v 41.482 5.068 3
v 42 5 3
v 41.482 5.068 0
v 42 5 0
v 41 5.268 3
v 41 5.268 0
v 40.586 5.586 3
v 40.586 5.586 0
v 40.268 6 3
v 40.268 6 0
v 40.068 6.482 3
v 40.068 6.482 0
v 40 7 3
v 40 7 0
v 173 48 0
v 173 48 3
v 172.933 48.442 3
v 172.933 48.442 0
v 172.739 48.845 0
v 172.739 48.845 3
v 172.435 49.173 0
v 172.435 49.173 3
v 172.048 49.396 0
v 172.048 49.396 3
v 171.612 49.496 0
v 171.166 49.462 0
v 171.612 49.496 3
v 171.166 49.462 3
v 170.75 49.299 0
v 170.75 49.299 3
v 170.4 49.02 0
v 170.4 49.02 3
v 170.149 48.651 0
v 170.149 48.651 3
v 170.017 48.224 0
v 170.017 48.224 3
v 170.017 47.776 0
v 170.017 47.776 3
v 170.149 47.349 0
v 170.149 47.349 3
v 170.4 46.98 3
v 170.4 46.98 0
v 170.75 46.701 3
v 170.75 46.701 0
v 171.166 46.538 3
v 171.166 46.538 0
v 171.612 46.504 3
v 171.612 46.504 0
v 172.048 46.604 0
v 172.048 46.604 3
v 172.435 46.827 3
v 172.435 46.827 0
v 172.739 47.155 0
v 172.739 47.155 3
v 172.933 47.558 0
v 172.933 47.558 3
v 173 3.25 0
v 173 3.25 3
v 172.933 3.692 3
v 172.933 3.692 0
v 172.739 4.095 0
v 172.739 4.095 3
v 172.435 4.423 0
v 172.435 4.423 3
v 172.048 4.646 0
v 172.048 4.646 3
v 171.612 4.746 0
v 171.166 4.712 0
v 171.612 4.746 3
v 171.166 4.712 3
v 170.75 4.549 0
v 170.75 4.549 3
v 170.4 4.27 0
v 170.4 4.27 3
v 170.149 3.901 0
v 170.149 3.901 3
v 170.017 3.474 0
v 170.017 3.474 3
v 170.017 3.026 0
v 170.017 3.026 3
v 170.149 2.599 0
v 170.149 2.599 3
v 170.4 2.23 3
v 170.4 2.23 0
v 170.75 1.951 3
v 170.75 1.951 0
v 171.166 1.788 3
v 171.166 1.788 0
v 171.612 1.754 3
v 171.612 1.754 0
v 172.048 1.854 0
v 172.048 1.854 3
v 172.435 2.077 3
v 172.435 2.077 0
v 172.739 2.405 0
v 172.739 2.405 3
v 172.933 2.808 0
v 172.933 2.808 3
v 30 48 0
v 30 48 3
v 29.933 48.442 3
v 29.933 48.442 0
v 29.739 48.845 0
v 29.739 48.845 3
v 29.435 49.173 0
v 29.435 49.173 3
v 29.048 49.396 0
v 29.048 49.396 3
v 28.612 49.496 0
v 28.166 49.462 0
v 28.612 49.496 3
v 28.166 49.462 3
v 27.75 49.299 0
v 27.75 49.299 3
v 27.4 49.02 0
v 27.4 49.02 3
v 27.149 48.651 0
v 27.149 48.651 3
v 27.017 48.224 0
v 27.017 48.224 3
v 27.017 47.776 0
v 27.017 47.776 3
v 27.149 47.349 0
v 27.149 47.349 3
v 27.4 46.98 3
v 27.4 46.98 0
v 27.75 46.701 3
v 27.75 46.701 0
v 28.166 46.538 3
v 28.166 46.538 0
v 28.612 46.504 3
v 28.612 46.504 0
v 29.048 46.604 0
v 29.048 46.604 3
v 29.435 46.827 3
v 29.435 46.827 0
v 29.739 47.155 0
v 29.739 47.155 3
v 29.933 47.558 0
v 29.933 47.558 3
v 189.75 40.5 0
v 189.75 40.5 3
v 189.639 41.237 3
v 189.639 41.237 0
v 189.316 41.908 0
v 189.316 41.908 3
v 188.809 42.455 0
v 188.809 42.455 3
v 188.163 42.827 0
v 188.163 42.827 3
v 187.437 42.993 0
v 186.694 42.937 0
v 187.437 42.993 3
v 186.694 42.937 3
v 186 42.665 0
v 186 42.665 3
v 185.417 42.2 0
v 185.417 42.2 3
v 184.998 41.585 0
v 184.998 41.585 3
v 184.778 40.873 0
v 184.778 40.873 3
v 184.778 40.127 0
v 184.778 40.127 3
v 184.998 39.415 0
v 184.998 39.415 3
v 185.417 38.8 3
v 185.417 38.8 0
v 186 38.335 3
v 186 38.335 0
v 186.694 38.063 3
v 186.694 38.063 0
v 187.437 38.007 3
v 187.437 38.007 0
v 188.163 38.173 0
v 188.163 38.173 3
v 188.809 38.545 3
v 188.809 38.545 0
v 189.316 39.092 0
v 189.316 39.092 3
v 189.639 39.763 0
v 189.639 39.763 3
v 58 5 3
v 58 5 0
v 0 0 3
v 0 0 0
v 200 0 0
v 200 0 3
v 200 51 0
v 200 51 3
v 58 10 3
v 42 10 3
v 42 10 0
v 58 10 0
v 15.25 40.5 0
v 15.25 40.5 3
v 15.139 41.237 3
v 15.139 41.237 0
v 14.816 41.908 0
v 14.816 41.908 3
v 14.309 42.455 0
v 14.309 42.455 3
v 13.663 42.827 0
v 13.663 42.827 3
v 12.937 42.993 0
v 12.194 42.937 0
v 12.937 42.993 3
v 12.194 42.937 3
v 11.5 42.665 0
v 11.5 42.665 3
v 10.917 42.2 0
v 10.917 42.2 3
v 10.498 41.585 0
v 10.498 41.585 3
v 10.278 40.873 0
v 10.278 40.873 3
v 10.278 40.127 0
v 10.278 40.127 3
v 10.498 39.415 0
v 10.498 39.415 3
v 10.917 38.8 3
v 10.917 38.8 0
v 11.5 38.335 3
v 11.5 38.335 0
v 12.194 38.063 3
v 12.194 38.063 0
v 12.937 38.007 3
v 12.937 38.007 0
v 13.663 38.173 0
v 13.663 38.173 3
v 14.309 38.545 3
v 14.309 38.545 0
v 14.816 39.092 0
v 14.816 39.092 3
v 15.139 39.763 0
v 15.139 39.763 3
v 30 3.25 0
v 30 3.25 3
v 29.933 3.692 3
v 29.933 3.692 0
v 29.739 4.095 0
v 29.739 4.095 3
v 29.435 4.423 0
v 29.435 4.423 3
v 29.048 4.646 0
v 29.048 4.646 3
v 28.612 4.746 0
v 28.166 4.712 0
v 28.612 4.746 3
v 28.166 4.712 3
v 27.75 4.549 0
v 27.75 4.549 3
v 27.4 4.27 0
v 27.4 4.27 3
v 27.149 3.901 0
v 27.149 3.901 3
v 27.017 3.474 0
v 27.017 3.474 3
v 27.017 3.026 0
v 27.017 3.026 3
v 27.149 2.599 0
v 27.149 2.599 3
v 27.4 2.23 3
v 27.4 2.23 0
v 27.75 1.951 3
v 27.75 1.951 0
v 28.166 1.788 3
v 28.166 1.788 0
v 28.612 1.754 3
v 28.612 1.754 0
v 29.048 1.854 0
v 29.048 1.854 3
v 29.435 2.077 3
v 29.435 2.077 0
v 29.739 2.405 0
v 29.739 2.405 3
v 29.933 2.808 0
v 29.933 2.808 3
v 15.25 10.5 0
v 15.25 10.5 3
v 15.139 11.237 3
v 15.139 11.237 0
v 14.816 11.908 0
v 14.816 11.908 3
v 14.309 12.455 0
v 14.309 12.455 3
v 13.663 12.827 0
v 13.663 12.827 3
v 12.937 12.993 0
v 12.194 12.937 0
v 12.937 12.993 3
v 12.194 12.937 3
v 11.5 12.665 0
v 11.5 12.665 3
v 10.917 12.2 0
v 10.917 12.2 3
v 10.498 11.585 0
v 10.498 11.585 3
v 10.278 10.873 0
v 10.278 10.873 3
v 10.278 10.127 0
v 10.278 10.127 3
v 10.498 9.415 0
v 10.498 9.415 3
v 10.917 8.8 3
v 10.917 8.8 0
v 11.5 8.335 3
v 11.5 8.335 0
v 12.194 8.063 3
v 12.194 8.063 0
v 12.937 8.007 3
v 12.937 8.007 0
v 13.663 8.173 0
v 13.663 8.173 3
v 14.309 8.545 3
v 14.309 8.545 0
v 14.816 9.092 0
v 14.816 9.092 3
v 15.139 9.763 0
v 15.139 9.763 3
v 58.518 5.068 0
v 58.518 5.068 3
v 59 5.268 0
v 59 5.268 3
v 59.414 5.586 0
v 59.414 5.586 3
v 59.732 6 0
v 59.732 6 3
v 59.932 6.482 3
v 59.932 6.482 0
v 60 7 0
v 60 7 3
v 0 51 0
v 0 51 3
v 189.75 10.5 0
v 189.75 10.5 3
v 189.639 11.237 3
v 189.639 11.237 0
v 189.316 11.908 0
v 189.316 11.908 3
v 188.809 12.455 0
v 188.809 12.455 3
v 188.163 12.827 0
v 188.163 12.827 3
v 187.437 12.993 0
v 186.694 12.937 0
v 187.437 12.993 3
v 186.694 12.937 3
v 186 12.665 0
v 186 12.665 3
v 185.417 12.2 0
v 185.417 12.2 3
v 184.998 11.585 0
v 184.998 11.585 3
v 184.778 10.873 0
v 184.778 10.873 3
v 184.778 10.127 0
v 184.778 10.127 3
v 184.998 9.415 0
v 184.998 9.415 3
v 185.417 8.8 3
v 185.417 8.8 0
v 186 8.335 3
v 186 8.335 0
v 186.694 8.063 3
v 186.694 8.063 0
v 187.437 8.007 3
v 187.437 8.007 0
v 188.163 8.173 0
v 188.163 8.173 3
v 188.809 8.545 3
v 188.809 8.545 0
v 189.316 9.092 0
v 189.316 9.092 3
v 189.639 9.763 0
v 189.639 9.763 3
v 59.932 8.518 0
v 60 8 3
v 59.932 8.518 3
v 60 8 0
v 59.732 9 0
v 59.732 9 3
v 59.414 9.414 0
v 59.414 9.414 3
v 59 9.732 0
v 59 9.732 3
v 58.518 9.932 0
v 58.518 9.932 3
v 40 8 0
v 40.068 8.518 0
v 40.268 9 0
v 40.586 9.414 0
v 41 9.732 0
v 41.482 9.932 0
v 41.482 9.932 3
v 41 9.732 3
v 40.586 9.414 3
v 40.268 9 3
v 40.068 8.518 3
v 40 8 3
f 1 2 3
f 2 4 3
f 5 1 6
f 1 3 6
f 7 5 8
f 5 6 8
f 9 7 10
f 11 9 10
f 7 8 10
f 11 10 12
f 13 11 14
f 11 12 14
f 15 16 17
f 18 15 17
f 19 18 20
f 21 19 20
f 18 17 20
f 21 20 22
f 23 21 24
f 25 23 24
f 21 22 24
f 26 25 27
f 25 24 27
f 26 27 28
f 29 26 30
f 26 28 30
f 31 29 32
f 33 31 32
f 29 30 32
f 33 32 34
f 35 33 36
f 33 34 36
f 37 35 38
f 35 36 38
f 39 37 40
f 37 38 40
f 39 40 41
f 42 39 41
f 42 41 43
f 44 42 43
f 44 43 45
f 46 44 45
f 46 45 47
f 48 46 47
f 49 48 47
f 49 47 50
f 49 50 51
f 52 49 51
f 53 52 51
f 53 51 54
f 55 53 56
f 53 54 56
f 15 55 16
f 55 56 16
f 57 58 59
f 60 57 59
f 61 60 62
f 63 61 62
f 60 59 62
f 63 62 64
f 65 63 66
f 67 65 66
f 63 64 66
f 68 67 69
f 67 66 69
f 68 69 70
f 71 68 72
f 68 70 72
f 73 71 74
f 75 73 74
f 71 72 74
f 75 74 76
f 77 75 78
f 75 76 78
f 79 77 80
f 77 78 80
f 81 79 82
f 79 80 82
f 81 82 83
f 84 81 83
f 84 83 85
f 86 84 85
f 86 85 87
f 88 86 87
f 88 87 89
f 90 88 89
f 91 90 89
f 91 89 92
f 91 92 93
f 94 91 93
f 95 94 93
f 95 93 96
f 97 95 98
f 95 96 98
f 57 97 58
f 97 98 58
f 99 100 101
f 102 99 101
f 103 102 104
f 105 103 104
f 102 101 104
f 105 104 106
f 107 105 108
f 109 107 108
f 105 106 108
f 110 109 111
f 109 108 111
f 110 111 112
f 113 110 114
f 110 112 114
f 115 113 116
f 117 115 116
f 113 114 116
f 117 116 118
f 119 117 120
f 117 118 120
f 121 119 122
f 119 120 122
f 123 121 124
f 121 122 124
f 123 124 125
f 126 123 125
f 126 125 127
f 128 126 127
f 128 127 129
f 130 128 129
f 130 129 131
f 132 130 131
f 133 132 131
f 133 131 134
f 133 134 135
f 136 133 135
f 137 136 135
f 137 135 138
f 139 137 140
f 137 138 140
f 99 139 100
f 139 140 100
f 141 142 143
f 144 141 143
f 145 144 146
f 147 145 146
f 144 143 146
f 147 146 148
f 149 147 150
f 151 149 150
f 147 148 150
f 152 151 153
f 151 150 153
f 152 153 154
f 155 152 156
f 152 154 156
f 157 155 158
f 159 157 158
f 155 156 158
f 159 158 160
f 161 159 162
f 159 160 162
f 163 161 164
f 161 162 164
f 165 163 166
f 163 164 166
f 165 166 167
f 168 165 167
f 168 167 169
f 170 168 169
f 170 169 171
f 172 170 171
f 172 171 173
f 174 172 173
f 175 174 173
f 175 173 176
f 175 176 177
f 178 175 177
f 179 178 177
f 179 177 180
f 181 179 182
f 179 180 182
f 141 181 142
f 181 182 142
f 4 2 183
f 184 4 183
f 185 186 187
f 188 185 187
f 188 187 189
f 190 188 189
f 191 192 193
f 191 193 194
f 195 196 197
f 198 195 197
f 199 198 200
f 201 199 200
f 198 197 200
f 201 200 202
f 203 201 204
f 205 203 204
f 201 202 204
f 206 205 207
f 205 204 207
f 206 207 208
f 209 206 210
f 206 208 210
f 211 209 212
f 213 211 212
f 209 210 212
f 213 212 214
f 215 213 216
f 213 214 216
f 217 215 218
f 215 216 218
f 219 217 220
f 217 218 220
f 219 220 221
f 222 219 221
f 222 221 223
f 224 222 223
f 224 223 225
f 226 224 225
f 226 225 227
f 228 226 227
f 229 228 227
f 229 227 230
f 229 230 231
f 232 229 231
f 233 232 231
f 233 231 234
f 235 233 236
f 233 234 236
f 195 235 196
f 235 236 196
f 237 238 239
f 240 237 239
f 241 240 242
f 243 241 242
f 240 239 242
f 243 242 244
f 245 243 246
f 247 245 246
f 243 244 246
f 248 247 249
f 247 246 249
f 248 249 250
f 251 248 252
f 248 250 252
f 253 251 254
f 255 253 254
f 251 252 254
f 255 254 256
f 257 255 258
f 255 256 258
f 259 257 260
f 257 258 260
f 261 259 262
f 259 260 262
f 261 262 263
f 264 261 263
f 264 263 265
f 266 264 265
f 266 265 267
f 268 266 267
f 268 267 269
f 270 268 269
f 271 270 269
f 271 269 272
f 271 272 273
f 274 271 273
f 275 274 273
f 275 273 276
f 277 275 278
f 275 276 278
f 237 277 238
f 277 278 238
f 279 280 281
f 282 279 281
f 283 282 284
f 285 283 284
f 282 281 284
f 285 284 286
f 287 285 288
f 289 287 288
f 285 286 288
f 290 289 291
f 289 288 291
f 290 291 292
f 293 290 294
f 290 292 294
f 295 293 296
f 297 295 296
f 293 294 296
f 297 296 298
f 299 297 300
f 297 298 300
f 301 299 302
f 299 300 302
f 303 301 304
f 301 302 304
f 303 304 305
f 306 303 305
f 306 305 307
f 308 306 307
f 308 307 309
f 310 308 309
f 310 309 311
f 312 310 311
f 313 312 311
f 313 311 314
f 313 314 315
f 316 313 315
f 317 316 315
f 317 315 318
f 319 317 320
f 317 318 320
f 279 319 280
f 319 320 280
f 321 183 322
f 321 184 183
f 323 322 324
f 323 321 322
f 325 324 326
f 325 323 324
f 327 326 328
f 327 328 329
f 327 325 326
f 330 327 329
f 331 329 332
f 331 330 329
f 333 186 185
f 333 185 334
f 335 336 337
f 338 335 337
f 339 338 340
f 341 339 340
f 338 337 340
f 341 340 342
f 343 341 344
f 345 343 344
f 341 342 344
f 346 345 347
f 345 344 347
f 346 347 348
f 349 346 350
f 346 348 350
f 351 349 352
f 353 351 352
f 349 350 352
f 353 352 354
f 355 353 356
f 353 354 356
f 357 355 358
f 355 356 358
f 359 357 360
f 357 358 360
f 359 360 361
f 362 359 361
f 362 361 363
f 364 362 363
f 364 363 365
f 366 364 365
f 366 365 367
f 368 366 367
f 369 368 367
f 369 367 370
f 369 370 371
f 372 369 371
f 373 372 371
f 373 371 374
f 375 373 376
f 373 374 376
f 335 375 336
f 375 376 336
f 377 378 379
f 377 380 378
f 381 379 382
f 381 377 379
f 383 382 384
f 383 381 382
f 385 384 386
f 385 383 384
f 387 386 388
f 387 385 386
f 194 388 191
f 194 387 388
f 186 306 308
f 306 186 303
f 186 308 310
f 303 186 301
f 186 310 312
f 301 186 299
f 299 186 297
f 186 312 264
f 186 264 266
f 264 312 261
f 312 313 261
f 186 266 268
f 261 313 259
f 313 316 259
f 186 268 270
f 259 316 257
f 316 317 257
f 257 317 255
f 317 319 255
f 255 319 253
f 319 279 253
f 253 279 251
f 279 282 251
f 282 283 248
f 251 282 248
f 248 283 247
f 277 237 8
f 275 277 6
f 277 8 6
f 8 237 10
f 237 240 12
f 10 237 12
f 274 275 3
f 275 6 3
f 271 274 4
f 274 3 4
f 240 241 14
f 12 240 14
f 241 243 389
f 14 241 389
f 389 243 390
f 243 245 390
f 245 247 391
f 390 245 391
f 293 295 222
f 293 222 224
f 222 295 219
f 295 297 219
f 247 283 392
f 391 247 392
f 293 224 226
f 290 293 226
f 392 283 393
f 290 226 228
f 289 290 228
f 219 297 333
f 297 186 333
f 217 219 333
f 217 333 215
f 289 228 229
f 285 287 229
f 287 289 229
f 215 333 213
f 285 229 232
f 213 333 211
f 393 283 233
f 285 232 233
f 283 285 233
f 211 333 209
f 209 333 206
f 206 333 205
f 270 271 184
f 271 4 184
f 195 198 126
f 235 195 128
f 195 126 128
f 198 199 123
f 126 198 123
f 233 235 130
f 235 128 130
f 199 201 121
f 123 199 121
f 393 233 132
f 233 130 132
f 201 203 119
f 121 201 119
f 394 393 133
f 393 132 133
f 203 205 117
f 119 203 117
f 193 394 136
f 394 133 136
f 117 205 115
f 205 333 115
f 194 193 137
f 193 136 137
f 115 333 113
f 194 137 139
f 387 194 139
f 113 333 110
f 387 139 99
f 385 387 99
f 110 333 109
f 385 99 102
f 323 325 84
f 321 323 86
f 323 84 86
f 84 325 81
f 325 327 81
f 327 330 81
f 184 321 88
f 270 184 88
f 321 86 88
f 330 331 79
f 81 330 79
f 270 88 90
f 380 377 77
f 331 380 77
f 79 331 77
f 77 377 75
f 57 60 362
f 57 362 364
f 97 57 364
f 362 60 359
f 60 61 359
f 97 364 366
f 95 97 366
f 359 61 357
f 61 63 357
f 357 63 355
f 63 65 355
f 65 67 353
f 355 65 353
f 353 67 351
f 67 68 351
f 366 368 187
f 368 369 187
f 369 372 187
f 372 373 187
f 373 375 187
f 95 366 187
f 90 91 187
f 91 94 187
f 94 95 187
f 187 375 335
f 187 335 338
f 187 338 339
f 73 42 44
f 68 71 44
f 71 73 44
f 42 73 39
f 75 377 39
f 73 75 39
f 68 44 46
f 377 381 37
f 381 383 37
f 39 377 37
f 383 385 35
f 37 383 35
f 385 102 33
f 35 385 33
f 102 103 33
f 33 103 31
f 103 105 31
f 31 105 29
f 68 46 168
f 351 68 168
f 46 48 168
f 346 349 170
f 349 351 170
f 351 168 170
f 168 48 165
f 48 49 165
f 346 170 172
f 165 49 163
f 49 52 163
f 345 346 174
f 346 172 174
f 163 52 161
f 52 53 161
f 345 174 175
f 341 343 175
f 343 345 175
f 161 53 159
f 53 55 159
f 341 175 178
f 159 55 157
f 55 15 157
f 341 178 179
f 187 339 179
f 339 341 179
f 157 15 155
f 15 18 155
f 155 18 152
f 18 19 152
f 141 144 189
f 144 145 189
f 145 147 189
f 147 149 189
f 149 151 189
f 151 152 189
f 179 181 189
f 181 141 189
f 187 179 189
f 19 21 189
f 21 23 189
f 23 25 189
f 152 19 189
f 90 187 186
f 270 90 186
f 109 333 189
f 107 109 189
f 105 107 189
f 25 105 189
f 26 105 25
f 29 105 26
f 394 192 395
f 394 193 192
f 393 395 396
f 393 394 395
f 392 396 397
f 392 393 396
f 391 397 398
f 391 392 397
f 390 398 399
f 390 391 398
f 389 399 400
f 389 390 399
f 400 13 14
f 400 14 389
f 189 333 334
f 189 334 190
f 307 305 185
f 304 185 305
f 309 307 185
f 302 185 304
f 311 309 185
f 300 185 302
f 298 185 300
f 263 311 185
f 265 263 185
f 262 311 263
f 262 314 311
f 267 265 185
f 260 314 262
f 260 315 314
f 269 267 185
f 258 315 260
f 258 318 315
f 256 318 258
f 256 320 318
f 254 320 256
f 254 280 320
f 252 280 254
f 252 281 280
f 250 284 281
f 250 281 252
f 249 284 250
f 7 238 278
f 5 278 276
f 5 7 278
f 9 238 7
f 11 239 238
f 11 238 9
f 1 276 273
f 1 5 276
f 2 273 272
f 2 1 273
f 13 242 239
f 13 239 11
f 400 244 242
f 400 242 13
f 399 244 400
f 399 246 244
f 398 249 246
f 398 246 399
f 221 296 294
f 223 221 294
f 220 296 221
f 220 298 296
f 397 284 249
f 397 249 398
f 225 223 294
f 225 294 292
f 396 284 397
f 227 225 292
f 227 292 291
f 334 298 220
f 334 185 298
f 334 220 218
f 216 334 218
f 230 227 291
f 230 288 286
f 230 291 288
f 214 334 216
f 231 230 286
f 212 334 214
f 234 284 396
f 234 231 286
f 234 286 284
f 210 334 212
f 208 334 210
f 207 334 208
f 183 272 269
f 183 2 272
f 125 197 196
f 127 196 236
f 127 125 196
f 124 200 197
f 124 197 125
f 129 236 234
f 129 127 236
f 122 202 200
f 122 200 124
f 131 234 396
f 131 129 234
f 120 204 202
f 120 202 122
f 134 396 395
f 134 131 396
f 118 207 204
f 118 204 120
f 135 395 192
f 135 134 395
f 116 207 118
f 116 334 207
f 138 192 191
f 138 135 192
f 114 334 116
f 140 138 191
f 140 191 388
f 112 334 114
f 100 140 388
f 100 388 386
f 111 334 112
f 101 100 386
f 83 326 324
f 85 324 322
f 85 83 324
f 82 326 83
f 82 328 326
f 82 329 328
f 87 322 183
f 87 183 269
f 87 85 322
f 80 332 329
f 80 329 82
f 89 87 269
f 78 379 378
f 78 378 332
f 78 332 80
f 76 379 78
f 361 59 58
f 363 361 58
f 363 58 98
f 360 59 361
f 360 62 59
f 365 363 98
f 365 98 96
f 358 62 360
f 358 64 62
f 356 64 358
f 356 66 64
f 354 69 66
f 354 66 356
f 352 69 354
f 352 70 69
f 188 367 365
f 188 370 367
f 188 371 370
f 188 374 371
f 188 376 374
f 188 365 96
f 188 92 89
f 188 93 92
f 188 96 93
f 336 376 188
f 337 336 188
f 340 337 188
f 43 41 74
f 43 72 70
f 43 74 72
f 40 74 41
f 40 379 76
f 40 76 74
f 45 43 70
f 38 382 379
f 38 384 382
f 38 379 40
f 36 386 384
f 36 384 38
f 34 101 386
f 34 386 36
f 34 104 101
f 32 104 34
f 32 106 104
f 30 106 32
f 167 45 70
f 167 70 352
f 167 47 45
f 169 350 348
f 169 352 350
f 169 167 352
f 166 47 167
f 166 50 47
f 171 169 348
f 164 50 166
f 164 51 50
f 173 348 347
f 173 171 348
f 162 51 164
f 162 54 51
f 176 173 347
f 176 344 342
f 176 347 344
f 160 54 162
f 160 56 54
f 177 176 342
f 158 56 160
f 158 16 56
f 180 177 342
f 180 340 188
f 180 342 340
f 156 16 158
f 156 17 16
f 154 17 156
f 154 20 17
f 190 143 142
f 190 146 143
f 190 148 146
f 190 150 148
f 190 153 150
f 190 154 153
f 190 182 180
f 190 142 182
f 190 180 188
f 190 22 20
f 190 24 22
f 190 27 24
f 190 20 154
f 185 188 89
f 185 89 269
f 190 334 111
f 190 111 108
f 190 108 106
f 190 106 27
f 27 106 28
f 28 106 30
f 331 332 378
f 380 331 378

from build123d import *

# Parameters (mm, degrees)
SKETCH1_W           = 200
SKETCH1_H           = 51
BOSS_EXTRUDE1_DEPTH = 3
SKETCH2_R           = 1.5
SKETCH2_R_2         = 2.5
CUT_EXTRUDE1_DEPTH  = 3
SKETCH3_W           = 20
SKETCH3_H           = 5
CUT_EXTRUDE2_DEPTH  = 3
FILLET1_R           = 2


with BuildPart() as part:
    # Sketch1 → Boss-Extrude1 (new body)
    with BuildSketch(Plane.XY):
        with Locations((100, 25.5)):
            Rectangle(SKETCH1_W, SKETCH1_H)
    extrude(amount=BOSS_EXTRUDE1_DEPTH)

    # Sketch2 → Cut-Extrude1 (cut)
    with BuildSketch(Plane.XY.offset(3)):
        with Locations((28.5, 48)):
            Circle(SKETCH2_R)
        with Locations((28.5, 3.25)):
            Circle(SKETCH2_R)
        with Locations((12.75, 40.5)):
            Circle(SKETCH2_R_2)
        with Locations((12.75, 10.5)):
            Circle(SKETCH2_R_2)
        with Locations((187.25, 40.5)):
            Circle(SKETCH2_R_2)
        with Locations((187.25, 10.5)):
            Circle(SKETCH2_R_2)
        with Locations((171.5, 3.25)):
            Circle(SKETCH2_R)
        with Locations((171.5, 48)):
            Circle(SKETCH2_R)
    extrude(amount=-CUT_EXTRUDE1_DEPTH, mode=Mode.SUBTRACT)

    # Sketch3 → Cut-Extrude2 (cut)
    with BuildSketch(Plane.XY.offset(3)):
        with Locations((50, 7.5)):
            Rectangle(SKETCH3_W, SKETCH3_H)
    extrude(amount=-CUT_EXTRUDE2_DEPTH, mode=Mode.SUBTRACT)

    # Fillet1
    fillet1_edges = [part.edges().sort_by_distance(p)[0] for p in [
        (40, 5, 1.5),
        (40, 10, 1.5),
        (60, 10, 1.5),
        (60, 5, 1.5),
    ]]
    fillet(fillet1_edges, radius=FILLET1_R)


solid = part.part
